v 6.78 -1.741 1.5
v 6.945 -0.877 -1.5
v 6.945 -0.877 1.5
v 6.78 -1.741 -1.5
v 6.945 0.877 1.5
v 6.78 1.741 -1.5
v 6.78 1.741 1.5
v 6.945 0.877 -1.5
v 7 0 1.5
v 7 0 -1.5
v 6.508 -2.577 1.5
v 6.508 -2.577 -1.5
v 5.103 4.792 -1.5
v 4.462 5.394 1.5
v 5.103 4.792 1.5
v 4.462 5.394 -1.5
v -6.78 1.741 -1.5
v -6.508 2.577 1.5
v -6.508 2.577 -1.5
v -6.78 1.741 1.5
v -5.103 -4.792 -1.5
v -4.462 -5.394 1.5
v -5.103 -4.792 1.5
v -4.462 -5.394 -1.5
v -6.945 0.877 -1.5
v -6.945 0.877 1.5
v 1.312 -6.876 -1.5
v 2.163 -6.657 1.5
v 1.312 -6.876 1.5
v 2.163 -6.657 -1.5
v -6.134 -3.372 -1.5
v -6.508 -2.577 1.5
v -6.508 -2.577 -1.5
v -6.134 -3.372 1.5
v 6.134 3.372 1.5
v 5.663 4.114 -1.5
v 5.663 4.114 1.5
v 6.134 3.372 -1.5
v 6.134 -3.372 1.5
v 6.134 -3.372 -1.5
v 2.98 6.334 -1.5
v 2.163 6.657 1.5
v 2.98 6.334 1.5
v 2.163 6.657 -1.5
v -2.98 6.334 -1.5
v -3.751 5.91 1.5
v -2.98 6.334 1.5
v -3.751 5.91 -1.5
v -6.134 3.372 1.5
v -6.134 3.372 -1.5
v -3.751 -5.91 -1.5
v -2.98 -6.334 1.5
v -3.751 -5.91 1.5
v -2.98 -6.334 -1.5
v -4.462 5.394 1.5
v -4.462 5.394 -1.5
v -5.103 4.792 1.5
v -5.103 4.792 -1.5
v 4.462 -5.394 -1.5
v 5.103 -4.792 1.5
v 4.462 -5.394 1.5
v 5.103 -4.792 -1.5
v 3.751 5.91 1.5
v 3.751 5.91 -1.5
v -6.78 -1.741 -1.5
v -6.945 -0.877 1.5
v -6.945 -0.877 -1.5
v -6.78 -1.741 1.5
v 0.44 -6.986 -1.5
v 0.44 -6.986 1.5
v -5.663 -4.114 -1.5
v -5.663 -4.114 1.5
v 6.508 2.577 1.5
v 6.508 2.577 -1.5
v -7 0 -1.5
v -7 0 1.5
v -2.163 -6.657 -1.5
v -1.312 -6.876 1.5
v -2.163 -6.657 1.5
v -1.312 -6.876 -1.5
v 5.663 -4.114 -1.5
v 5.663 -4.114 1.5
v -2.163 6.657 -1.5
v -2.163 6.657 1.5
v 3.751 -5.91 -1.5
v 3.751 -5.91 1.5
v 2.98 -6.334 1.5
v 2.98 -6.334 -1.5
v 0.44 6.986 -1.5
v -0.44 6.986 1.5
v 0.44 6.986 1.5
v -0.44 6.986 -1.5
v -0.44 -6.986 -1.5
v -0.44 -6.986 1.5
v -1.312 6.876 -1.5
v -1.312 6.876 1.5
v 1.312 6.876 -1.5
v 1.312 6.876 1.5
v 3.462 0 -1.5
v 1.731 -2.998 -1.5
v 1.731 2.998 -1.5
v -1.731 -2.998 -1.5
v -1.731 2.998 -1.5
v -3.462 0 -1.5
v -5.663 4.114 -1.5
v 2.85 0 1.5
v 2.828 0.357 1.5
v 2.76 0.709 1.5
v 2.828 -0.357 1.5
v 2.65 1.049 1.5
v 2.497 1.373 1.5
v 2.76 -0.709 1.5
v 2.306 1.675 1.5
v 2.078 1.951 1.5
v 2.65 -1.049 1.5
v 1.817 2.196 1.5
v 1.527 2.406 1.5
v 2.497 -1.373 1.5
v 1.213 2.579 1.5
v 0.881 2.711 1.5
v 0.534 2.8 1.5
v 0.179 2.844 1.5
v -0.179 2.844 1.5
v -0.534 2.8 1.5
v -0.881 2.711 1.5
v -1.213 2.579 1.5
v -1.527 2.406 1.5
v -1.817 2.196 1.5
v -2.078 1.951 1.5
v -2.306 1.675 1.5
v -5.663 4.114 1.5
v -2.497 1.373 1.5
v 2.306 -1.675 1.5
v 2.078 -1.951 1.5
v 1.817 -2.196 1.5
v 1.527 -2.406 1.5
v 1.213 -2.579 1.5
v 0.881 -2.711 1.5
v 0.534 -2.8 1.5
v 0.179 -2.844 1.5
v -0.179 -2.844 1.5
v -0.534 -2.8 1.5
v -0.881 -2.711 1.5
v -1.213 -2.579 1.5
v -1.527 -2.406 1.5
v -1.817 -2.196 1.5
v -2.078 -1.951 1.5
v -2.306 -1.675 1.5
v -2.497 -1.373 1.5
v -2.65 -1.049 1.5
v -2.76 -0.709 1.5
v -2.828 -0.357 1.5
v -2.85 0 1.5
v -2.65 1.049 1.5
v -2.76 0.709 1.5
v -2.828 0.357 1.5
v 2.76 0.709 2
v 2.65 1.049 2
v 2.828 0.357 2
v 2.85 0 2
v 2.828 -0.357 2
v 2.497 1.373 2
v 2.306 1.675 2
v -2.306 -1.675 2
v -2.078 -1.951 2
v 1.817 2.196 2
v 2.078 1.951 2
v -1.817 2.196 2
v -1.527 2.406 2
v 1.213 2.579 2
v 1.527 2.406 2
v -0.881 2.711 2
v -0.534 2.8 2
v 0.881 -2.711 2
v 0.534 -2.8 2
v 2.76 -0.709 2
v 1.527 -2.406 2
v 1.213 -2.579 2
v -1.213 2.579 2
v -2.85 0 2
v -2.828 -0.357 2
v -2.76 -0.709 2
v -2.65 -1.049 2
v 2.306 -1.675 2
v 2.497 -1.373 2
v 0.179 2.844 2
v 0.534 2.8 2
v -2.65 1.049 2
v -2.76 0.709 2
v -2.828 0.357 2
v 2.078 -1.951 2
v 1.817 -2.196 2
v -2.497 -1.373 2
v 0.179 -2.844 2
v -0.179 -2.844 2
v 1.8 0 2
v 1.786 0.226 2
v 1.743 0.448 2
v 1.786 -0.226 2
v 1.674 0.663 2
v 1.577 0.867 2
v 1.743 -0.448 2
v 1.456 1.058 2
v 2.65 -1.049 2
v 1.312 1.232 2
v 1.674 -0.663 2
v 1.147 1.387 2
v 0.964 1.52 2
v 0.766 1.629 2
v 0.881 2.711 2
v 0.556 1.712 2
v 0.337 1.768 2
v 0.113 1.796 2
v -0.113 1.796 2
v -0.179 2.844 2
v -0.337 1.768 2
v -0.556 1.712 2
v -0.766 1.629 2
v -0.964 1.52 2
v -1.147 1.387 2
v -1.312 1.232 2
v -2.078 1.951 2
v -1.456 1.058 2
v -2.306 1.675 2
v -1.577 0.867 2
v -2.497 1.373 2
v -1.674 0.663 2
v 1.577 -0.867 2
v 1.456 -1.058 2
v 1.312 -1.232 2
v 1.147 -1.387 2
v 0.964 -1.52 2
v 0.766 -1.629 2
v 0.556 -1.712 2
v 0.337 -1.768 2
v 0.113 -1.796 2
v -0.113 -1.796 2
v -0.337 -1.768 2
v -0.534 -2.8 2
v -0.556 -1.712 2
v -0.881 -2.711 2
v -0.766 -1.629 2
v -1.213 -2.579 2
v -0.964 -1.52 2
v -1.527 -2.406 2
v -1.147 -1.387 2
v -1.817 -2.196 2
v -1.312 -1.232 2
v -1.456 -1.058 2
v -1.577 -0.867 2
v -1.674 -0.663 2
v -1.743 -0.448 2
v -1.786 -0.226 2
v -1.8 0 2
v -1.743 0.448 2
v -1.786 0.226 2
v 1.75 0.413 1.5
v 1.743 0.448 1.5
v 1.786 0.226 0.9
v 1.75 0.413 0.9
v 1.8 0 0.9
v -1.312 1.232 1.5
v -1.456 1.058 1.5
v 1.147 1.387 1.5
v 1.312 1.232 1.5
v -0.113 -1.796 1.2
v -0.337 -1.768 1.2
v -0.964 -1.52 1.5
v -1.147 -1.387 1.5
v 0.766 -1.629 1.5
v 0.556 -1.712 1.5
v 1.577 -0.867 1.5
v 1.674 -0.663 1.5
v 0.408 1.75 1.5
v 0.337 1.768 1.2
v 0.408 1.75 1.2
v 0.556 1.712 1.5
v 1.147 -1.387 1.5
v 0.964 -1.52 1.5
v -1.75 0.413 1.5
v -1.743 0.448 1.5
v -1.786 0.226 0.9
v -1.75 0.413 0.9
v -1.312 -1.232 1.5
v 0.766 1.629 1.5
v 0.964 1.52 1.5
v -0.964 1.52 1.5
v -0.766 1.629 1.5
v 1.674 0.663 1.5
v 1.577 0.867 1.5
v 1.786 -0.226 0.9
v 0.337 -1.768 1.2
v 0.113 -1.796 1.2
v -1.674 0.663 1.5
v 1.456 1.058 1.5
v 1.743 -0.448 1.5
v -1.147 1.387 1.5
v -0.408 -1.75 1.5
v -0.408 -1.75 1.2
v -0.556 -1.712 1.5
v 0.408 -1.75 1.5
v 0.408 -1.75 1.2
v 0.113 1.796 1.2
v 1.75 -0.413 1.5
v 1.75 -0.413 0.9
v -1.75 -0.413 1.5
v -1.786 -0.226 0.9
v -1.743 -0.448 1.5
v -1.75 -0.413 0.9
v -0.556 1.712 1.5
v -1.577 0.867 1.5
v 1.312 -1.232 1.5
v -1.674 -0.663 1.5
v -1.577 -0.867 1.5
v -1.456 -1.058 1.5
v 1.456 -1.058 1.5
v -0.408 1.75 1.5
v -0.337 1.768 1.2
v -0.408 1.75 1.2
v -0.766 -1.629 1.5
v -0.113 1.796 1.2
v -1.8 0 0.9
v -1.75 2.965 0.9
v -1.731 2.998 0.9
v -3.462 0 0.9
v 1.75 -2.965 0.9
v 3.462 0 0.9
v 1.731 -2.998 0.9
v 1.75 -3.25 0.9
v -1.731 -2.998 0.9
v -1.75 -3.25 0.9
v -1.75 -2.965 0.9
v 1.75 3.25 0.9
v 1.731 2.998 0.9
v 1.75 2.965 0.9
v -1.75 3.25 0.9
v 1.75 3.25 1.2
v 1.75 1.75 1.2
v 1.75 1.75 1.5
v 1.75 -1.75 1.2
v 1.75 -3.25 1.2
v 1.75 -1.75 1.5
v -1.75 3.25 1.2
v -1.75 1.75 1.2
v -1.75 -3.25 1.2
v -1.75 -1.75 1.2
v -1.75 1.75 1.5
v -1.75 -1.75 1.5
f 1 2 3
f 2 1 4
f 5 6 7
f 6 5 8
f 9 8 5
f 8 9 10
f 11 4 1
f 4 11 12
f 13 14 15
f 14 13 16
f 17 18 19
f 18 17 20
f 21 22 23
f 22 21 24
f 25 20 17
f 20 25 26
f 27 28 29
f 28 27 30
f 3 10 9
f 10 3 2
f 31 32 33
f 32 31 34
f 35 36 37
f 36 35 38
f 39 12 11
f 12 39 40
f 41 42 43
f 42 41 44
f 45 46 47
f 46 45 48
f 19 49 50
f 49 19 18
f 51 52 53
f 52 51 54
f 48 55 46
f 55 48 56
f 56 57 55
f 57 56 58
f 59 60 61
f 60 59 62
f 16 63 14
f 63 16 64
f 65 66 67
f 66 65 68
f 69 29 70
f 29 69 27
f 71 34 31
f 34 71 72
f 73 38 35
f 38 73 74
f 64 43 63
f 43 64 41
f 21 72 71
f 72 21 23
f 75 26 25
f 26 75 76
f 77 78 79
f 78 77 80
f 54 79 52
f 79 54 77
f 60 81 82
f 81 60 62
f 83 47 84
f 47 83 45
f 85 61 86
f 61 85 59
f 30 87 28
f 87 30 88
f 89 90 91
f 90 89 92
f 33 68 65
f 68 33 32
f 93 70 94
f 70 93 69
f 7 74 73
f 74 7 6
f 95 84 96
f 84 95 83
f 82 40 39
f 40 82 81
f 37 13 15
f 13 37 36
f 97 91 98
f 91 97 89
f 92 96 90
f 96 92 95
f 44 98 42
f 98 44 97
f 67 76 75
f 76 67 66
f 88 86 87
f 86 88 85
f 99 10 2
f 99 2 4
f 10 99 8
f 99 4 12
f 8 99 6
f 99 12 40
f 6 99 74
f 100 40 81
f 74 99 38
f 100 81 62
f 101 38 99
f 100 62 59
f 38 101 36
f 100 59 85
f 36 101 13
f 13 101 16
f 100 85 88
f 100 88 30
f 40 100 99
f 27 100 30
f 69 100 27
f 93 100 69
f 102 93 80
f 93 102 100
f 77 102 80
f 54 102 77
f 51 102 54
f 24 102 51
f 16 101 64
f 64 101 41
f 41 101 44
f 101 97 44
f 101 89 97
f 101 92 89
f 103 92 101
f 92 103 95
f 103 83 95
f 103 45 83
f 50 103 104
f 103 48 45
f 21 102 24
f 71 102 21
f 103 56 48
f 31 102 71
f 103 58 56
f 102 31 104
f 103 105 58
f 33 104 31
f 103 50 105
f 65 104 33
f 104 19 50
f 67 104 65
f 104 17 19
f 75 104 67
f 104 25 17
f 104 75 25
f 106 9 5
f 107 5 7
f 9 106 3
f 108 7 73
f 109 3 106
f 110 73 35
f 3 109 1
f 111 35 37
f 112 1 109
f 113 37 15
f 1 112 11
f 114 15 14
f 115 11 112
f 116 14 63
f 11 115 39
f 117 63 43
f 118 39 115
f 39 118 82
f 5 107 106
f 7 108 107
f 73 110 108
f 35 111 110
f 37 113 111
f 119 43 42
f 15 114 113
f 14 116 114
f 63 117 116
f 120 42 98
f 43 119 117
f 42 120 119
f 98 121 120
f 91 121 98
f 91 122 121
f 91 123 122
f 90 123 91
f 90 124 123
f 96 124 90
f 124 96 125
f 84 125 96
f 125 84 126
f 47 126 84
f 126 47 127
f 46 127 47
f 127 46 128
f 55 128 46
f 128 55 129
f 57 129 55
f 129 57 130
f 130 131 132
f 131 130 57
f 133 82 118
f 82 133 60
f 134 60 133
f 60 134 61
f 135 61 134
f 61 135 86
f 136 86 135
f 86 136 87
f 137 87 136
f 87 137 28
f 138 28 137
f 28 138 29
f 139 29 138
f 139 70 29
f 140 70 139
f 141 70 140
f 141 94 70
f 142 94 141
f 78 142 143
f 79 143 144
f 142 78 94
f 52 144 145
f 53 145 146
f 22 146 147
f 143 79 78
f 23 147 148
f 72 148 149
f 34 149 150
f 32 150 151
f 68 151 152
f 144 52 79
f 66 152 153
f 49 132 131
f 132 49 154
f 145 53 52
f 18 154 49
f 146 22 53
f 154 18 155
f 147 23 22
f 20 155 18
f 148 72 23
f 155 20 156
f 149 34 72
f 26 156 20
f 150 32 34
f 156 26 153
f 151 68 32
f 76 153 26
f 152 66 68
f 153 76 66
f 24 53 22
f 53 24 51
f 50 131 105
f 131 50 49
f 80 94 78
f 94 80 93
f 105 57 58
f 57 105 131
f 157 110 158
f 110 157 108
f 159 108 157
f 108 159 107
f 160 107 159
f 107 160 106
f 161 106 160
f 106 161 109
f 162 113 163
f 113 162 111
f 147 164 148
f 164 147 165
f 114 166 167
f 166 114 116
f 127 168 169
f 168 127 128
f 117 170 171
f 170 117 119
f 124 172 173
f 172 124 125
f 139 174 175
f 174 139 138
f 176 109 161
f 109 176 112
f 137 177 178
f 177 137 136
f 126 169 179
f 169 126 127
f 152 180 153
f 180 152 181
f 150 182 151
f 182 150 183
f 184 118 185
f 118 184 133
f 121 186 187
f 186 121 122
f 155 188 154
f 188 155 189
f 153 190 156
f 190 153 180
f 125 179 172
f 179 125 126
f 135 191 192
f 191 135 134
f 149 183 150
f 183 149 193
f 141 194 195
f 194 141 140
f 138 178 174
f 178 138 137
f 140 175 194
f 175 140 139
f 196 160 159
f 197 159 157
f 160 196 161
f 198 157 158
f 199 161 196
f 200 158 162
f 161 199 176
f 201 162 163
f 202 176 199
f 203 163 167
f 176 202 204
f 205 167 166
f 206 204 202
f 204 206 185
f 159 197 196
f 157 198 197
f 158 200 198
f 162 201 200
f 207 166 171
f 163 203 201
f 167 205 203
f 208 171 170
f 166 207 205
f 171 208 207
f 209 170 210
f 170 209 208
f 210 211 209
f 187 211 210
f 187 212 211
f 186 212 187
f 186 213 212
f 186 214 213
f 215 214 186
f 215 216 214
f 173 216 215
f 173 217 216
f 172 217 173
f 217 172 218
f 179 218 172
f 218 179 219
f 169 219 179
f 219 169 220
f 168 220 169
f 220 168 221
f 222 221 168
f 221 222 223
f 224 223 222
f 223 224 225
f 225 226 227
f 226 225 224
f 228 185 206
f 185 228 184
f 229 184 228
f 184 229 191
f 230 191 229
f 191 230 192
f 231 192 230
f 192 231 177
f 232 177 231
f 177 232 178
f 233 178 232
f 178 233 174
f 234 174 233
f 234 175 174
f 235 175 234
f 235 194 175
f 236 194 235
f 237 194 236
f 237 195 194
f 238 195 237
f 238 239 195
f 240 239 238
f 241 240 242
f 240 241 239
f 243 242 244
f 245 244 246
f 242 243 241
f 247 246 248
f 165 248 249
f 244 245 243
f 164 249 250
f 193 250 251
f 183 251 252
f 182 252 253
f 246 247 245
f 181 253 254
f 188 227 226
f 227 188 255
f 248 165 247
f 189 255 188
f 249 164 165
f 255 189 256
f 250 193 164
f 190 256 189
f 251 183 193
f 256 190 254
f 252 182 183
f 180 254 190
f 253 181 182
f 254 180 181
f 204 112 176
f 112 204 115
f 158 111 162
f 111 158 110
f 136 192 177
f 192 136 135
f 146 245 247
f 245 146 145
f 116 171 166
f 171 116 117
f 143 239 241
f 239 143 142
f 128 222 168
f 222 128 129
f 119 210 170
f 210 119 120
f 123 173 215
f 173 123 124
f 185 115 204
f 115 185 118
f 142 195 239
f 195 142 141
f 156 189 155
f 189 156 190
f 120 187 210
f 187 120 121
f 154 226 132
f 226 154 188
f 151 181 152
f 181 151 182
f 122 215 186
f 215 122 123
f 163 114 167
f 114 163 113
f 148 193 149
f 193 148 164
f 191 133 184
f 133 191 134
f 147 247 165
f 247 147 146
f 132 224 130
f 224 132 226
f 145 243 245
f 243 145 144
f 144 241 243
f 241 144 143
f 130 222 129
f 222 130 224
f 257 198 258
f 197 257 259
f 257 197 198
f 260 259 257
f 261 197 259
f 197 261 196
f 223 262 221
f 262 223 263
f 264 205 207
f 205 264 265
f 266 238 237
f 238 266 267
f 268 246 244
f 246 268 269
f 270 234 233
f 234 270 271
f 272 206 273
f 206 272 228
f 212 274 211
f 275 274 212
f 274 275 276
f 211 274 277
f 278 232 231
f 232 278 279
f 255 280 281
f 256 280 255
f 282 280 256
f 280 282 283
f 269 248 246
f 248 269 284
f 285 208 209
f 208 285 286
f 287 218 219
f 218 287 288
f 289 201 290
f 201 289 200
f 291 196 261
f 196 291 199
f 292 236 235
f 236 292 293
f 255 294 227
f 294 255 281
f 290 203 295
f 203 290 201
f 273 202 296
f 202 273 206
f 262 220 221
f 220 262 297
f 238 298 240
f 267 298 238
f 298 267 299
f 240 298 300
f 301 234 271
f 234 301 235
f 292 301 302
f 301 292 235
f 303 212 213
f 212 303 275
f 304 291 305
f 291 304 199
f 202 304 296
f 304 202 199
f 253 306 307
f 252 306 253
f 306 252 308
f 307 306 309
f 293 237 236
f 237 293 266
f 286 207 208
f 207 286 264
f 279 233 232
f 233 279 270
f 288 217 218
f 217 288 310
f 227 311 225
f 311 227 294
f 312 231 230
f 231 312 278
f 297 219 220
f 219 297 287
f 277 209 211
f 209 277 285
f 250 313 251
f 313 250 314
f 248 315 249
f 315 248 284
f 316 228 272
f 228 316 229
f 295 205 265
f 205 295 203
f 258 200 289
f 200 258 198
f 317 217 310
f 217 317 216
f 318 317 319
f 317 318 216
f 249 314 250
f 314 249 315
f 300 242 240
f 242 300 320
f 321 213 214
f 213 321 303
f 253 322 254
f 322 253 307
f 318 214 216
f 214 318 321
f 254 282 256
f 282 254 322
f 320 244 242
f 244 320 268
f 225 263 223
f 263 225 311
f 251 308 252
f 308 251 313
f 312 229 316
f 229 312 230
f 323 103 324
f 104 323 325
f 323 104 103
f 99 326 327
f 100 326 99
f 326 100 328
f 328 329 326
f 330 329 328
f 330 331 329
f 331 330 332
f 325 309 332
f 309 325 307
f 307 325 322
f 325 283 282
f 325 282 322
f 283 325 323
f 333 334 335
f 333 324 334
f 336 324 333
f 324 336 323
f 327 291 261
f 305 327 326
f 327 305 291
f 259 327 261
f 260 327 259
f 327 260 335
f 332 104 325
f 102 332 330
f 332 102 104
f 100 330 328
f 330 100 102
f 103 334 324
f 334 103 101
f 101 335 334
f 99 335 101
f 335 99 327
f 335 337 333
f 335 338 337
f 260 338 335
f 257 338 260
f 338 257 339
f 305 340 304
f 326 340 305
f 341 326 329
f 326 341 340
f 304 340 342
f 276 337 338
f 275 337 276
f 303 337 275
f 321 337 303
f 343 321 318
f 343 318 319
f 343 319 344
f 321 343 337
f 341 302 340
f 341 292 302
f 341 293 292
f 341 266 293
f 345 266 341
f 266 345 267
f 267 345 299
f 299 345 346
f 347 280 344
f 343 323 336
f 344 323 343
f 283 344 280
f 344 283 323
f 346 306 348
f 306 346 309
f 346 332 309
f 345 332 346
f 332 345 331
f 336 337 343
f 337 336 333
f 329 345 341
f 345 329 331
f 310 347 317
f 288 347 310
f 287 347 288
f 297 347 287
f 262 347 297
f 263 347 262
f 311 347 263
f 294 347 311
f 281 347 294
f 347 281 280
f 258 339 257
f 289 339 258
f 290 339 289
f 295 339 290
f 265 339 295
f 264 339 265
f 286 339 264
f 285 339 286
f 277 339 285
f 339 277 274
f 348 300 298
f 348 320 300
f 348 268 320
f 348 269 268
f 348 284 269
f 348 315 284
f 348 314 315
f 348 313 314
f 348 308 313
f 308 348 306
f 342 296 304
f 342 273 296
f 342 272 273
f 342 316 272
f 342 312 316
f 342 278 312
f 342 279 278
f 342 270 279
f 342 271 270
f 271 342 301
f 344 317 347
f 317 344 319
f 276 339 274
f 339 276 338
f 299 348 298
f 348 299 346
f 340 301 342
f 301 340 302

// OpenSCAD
$fn = 50;


difference() {
	union() {
		translate(v = [0, 0, -1.5000000000]) {
			rotate(a = [0, 0, 0]) {
				cylinder(h = 3, r = 7.0000000000);
			}
		}
		translate(v = [0, 0, -1.5000000000]) {
			rotate(a = [0, 0, 0]) {
				cylinder(h = 3.5000000000, r = 2.8500000000);
			}
		}
	}
	union() {
		translate(v = [0, 0, -125.0000000000]) {
			rotate(a = [0, 0, 0]) {
				cylinder(h = 250, r = 1.8000000000);
			}
		}
		translate(v = [0, 0, -2.1000000000]) {
			rotate(a = [0, 0, 0]) {
				#translate(v = [0, 0, 0]) {
					rotate(a = [0, 0, 0]) {
						linear_extrude(height = 3) {
							polygon(points = [[3.4620000000, 0.0000000000], [1.7310000000, 2.9981799479], [-1.7310000000, 2.9981799479], [-3.4620000000, 0.0000000000], [-1.7310000000, -2.9981799479], [1.7310000000, -2.9981799479]]);
						}
					}
				}
			}
		}
		#translate(v = [-1.7500000000, -3.2500000000, 0.9000000000]) {
			rotate(a = [0, 0, 0]) {
				cube(size = [3.5000000000, 6.5000000000, 0.3000000000]);
			}
		}
		#translate(v = [-1.7500000000, -1.7500000000, 1.2000000000]) {
			rotate(a = [0, 0, 0]) {
				cube(size = [3.5000000000, 3.5000000000, 0.3000000000]);
			}
		}
		#translate(v = [-1.7500000000, -3.2500000000, -2.4000000000]) {
			rotate(a = [0, 0, 0]) {
				cube(size = [3.5000000000, 6.5000000000, 0.3000000000]);
			}
		}
		#translate(v = [-1.7500000000, -1.7500000000, -2.7000000000]) {
			rotate(a = [0, 0, 0]) {
				cube(size = [3.5000000000, 3.5000000000, 0.3000000000]);
			}
		}
	}
}
